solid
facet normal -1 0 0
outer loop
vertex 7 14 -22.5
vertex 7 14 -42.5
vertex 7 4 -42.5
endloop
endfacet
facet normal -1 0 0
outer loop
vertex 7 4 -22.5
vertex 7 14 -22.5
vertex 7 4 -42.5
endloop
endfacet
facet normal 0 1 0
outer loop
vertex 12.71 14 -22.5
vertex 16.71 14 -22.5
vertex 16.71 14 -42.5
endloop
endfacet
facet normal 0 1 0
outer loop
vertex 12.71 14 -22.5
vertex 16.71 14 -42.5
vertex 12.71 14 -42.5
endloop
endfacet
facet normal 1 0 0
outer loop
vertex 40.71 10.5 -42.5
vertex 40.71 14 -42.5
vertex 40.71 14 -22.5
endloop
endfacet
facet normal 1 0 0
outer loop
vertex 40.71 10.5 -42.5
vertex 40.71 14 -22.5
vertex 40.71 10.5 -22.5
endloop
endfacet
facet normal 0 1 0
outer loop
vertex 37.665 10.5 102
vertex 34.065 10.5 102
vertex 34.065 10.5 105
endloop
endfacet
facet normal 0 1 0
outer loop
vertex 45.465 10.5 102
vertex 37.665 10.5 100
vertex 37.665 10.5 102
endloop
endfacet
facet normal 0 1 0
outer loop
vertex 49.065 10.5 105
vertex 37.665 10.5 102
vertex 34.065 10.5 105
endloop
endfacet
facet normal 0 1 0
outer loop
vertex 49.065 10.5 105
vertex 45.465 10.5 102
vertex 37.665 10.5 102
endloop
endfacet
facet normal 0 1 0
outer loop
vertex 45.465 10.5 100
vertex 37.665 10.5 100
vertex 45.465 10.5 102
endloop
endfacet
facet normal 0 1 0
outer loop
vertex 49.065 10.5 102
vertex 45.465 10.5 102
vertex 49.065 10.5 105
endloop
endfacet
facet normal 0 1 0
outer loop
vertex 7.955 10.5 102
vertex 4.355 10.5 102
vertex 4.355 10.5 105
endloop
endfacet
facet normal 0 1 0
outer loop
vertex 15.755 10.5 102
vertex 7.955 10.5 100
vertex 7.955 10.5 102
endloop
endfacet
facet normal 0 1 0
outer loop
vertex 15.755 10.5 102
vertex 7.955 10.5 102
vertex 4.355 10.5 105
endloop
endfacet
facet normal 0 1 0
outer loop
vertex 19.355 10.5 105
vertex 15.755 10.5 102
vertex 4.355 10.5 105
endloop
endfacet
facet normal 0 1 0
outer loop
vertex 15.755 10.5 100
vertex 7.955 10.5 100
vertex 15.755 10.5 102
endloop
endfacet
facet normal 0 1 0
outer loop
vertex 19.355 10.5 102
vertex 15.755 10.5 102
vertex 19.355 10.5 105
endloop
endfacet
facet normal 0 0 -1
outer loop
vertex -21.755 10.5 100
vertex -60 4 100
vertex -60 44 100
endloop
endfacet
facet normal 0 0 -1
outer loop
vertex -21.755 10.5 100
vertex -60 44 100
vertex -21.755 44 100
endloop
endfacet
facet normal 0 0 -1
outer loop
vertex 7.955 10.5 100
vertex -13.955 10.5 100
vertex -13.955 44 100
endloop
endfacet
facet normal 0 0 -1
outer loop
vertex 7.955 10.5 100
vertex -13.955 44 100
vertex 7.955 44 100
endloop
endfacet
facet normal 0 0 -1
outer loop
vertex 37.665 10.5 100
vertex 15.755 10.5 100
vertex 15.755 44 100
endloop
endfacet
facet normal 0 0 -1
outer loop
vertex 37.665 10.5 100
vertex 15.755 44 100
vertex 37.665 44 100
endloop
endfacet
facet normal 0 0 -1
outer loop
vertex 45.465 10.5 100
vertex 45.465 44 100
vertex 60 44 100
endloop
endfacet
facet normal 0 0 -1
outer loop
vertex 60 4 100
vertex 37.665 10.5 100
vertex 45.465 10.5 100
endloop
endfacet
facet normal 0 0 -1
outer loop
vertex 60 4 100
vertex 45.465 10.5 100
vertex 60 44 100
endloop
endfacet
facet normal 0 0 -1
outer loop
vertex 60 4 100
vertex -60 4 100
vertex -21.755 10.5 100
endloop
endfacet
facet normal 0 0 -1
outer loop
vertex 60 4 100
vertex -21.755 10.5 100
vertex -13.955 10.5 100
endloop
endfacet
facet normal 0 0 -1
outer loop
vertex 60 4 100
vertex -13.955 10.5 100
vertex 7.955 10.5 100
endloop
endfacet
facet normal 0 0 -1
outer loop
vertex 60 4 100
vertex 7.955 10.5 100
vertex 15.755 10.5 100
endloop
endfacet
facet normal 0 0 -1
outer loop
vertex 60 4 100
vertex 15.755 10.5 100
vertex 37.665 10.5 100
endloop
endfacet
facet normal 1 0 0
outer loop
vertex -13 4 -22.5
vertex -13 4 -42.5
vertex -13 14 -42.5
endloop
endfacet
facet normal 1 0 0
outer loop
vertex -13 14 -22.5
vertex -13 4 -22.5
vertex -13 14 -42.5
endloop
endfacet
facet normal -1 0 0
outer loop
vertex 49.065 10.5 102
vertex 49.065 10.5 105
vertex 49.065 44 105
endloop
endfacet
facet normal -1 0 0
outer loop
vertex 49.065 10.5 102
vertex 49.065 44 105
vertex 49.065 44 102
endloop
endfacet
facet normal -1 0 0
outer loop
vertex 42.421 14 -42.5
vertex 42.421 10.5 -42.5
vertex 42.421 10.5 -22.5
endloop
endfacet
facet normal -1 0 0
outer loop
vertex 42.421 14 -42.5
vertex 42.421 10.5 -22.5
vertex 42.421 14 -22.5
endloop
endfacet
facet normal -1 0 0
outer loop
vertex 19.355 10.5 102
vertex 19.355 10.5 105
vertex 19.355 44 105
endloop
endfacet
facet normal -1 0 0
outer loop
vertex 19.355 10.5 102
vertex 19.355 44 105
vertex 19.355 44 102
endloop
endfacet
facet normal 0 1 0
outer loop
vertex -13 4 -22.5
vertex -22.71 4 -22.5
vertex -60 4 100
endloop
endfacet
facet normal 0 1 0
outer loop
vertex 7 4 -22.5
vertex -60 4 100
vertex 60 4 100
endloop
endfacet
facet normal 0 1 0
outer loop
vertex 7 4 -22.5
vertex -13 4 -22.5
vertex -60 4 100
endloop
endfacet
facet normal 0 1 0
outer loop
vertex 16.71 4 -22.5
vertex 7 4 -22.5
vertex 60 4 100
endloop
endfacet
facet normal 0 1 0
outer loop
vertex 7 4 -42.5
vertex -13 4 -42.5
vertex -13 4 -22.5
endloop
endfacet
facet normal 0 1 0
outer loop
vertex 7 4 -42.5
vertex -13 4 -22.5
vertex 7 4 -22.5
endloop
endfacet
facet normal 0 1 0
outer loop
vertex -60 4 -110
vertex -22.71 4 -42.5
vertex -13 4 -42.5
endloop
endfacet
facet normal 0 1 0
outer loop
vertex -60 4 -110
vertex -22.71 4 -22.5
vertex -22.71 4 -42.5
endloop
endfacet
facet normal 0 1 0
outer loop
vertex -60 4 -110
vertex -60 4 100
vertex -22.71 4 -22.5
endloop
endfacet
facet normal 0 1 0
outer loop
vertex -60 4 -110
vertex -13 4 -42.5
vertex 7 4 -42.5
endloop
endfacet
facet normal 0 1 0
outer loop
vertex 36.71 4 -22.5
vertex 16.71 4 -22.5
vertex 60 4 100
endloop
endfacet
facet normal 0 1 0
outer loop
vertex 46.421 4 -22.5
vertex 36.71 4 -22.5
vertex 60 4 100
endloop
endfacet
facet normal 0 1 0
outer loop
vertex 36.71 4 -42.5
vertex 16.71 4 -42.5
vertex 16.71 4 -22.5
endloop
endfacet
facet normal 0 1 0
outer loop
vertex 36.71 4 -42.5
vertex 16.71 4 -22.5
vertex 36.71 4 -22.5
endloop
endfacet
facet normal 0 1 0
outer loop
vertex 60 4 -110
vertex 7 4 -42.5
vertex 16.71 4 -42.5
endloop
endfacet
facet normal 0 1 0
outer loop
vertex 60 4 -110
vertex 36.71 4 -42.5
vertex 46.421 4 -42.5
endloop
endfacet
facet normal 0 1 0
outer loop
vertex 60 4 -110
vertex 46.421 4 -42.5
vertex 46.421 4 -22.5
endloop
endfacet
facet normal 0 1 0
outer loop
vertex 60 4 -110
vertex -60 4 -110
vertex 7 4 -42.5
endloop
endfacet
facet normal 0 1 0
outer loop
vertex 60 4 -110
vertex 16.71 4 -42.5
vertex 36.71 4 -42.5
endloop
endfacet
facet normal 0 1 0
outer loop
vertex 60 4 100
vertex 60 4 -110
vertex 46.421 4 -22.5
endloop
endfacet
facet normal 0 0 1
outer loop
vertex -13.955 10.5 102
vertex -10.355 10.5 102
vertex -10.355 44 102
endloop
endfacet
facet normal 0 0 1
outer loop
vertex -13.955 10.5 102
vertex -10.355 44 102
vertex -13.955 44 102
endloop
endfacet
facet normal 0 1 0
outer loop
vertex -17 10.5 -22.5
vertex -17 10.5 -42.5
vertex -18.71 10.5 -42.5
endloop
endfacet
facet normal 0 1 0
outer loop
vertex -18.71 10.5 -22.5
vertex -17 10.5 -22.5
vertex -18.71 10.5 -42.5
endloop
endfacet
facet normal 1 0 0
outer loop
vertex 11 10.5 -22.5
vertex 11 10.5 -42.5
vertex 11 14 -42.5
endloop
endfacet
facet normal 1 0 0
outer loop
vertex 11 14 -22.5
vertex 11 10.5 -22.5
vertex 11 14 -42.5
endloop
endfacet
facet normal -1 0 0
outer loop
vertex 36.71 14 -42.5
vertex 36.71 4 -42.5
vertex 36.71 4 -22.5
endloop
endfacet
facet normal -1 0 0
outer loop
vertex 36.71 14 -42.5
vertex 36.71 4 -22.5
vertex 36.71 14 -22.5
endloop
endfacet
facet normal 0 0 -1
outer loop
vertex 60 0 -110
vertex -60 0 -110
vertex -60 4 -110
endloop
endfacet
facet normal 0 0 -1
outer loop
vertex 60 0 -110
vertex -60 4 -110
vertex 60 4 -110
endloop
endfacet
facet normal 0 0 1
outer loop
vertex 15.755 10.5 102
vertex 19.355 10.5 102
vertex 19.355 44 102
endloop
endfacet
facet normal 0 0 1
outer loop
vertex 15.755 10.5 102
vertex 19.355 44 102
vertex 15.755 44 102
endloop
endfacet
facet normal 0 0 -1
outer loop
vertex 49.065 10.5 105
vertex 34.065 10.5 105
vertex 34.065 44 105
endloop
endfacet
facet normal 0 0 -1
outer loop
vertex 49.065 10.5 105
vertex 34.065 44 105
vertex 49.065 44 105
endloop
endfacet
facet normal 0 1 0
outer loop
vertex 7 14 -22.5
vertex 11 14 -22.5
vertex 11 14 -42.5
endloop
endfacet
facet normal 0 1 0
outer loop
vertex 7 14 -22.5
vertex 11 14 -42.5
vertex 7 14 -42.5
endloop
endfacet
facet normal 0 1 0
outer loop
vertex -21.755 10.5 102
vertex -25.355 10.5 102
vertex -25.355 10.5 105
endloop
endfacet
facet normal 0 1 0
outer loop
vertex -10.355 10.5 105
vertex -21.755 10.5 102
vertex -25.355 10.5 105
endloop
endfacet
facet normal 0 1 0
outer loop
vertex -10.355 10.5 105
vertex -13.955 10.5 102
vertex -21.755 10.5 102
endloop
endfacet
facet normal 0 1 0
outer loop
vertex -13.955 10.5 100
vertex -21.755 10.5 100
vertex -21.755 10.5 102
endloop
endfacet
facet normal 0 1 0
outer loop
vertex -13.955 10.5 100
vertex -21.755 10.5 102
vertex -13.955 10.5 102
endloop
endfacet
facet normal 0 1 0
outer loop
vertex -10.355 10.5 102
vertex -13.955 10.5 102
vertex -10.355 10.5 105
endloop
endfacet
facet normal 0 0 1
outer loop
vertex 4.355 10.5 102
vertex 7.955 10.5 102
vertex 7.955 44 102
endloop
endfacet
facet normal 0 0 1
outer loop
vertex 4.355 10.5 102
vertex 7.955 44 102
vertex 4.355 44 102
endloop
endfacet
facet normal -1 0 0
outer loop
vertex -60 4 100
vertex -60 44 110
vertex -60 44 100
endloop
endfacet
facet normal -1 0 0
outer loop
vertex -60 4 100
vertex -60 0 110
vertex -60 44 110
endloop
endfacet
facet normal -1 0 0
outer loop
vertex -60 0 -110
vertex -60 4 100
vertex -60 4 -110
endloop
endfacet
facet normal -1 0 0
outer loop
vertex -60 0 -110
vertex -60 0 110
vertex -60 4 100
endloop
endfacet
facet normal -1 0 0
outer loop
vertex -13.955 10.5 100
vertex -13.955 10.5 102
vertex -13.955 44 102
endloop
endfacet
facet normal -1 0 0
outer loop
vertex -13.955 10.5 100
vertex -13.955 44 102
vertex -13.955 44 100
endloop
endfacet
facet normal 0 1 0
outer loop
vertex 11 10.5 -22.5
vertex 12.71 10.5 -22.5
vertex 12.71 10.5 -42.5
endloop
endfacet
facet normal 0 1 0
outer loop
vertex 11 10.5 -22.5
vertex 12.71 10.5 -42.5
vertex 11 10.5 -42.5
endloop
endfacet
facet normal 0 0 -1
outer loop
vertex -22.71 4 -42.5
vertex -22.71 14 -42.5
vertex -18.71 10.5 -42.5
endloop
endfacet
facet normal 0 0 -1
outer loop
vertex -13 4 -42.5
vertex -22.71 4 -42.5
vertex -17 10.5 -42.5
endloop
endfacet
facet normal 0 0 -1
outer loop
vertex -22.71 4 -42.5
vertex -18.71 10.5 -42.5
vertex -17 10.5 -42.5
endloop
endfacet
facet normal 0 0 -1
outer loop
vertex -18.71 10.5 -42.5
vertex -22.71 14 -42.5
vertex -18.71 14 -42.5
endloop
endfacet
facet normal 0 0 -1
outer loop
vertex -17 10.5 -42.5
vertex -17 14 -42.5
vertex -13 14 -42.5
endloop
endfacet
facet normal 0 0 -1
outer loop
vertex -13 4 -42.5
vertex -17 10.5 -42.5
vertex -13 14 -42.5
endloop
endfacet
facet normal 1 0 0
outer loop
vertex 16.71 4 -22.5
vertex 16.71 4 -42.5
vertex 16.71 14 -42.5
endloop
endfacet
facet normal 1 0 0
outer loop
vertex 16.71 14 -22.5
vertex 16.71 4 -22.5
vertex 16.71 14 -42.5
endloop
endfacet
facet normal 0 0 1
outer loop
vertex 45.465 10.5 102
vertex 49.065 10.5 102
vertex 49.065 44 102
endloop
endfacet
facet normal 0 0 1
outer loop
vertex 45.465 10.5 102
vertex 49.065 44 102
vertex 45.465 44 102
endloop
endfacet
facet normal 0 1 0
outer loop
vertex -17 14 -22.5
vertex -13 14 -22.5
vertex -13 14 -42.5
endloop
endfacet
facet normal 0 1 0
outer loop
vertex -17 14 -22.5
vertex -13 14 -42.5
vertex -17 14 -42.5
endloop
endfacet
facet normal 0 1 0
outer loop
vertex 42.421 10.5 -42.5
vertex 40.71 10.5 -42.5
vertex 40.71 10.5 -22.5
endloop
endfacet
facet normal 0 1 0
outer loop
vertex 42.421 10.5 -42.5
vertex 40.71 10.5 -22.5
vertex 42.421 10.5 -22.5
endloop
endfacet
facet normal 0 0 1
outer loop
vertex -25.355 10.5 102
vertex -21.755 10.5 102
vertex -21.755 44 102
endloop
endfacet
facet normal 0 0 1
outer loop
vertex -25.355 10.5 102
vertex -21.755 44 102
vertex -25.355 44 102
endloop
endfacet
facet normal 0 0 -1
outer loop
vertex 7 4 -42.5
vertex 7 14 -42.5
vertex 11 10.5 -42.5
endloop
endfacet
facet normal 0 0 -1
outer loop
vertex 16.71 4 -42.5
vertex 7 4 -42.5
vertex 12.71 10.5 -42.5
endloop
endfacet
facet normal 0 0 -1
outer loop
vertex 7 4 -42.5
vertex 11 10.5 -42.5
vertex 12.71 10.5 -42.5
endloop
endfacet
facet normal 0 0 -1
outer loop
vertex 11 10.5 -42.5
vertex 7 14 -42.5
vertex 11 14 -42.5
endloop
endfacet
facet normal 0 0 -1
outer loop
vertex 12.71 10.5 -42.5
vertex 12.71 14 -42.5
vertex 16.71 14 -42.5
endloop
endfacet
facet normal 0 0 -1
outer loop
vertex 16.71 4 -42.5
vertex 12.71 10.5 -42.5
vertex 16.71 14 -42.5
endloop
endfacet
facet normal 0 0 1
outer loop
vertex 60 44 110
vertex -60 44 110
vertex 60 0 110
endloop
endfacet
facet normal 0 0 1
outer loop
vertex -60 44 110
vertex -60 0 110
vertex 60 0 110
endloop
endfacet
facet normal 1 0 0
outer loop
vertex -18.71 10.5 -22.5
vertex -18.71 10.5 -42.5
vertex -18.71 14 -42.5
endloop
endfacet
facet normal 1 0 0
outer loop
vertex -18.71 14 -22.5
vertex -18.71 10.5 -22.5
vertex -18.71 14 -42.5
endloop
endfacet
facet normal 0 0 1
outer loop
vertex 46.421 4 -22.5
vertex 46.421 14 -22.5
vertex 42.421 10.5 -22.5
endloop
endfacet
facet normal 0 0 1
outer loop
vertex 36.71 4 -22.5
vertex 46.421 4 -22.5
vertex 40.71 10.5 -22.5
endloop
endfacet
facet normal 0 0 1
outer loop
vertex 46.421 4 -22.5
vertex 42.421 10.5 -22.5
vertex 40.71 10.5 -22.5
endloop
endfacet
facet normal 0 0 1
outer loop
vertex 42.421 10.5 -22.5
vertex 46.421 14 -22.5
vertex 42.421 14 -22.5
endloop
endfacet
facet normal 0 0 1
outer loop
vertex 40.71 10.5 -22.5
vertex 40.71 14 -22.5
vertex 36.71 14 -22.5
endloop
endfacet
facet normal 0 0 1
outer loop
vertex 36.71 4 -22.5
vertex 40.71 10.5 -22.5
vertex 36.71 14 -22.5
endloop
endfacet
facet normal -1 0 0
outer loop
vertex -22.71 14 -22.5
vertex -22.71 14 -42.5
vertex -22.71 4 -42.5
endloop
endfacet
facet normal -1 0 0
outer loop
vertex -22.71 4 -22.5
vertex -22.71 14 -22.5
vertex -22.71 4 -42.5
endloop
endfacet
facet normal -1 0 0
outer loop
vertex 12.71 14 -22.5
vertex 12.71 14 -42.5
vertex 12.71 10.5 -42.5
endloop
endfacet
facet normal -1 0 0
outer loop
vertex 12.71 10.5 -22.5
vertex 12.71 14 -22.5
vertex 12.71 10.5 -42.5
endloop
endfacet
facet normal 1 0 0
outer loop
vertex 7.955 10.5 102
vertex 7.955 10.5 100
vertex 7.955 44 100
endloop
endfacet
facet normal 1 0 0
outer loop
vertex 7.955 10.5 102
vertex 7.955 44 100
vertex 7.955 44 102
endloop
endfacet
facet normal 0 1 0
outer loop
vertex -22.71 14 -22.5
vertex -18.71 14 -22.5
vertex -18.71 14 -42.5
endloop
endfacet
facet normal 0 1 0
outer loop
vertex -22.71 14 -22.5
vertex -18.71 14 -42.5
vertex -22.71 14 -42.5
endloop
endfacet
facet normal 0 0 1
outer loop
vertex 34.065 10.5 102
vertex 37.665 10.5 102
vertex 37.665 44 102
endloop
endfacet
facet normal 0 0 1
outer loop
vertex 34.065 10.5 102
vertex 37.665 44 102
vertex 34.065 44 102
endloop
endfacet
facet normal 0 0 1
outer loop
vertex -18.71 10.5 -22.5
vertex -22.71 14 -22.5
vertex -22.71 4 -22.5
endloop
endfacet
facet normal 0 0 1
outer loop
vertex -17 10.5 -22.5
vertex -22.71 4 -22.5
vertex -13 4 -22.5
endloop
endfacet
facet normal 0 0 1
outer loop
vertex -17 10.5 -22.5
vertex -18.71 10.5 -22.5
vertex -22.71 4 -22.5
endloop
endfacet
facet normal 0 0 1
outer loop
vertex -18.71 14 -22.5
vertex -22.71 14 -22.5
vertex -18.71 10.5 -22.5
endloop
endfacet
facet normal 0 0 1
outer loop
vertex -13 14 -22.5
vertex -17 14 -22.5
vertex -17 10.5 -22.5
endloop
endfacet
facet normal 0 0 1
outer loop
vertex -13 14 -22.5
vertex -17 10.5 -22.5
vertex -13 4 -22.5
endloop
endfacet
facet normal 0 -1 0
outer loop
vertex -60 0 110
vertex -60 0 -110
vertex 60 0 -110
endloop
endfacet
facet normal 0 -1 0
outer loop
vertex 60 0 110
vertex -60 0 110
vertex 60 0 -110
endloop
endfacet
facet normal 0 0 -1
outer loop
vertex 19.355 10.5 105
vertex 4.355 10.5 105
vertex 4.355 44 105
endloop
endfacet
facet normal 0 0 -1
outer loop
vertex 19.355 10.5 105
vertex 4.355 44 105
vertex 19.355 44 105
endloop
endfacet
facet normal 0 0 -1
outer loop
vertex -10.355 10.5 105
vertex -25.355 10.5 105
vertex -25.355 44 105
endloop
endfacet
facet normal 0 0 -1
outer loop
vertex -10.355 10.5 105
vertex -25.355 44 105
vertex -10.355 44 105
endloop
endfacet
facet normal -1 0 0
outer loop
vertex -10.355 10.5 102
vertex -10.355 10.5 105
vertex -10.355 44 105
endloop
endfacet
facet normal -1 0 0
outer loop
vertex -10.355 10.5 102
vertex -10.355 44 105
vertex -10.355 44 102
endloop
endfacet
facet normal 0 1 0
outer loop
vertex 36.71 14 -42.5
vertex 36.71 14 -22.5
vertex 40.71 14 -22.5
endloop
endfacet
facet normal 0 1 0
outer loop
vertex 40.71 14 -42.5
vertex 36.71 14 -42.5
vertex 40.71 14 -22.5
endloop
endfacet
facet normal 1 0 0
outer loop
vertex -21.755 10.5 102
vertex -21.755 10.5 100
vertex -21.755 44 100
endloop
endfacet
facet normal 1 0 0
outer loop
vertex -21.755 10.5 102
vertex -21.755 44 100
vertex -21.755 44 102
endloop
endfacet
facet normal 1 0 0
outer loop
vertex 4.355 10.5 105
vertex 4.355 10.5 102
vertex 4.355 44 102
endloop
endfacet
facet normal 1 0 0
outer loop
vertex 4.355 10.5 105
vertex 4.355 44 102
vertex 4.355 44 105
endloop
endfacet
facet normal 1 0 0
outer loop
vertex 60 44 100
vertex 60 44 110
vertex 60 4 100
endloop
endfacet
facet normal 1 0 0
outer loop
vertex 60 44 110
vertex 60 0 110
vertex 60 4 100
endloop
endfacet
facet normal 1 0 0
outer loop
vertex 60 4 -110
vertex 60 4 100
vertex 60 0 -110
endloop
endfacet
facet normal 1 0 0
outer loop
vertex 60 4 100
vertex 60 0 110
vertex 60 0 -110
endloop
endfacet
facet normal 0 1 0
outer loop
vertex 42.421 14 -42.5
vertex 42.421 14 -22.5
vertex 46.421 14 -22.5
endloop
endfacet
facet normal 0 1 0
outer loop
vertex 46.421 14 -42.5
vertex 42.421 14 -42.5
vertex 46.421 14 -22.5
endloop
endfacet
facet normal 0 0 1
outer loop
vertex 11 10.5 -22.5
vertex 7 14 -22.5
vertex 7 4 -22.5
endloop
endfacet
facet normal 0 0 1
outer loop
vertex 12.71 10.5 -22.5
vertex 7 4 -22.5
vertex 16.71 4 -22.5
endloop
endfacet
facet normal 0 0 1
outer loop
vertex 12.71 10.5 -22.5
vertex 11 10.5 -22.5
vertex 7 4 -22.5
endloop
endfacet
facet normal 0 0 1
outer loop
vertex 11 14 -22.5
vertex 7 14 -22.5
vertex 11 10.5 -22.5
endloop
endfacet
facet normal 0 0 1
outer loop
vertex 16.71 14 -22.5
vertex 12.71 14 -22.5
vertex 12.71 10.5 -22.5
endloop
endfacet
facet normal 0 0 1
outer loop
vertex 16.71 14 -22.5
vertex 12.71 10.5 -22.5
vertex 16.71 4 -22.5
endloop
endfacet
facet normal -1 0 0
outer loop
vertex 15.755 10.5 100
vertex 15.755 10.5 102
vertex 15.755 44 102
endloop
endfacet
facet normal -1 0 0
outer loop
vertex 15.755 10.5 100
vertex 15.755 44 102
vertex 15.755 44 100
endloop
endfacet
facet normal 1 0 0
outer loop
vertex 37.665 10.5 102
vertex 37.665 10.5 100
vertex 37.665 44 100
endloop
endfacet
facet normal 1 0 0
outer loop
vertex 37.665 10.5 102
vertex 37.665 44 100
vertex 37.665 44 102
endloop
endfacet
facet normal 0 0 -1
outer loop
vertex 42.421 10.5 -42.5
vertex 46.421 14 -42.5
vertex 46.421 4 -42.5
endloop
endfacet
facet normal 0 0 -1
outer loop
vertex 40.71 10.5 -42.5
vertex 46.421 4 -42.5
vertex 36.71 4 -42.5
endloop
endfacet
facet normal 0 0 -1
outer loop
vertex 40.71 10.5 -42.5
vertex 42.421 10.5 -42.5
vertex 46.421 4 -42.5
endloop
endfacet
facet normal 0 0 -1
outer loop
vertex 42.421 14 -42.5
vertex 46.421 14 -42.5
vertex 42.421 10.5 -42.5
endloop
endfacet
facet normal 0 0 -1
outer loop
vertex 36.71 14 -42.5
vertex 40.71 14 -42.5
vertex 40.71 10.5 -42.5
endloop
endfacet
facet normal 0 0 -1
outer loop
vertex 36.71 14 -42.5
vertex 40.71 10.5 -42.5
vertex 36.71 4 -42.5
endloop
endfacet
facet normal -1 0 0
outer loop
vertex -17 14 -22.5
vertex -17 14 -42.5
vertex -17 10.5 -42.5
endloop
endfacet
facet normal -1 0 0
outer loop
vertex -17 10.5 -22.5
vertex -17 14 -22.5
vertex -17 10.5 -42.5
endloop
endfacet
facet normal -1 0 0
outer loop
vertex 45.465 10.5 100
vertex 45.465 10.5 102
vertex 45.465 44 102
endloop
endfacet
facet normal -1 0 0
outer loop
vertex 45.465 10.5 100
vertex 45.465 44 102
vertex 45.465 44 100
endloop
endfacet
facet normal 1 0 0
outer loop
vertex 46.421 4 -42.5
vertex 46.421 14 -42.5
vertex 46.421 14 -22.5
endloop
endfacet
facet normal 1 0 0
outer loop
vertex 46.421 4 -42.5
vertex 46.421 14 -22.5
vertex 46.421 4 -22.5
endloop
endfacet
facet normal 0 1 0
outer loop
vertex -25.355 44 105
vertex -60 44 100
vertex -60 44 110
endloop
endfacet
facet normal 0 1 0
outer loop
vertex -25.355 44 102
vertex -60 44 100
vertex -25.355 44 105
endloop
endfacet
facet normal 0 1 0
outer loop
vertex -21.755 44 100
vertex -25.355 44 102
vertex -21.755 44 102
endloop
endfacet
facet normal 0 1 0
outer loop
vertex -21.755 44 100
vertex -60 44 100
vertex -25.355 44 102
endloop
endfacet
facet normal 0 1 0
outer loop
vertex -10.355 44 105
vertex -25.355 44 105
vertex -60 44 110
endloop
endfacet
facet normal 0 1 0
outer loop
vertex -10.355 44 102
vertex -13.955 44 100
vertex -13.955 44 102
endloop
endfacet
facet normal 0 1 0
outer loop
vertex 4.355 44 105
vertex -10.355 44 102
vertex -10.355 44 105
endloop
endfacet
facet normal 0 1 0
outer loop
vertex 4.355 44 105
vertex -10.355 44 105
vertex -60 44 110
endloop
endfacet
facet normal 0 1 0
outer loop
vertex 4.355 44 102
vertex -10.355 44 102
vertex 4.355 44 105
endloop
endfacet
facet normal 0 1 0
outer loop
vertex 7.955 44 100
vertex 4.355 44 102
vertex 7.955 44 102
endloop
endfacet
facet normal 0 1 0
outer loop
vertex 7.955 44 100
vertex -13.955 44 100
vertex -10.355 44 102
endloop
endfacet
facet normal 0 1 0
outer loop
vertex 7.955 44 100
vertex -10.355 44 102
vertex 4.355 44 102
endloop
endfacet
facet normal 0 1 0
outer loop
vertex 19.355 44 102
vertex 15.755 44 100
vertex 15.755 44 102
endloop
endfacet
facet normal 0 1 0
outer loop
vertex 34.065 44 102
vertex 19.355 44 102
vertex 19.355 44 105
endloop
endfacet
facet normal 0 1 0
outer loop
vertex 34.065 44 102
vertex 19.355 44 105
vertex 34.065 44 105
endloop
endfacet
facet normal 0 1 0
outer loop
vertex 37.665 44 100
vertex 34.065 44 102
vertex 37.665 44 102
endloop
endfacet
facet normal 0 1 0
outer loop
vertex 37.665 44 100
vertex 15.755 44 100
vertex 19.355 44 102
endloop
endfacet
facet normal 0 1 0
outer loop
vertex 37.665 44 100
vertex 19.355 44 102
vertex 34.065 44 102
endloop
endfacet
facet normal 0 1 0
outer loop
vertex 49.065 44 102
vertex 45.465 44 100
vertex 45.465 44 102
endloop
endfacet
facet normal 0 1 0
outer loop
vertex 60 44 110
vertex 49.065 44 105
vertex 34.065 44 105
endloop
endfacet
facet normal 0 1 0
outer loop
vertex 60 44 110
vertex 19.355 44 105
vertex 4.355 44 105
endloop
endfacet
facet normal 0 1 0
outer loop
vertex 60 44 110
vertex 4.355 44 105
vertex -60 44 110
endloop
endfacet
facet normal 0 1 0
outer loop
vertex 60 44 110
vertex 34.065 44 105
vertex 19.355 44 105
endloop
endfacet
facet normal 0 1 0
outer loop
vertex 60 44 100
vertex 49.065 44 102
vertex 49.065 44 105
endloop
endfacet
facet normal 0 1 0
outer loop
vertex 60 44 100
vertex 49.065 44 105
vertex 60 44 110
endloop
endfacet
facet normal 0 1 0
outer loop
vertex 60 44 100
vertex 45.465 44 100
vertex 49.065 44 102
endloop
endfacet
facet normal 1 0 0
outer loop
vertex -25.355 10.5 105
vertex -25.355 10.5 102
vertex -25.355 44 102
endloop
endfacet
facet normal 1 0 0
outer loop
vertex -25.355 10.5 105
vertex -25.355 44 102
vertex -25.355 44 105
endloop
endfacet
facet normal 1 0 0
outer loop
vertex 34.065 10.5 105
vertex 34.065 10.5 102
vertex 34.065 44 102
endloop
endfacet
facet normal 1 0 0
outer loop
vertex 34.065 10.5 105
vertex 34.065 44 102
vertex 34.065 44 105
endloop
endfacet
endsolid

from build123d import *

# Parameters (mm, degrees)
SKETCH1_W           = 120
SKETCH1_H           = 220
BOSS_EXTRUDE1_DEPTH = 4
SKETCH2_W           = 120
SKETCH2_H           = 10
BOSS_EXTRUDE2_DEPTH = 40
CUT_EXTRUDE1_START  = -33.5
CUT_EXTRUDE1_DEPTH  = 33.5
BOSS_EXTRUDE3_DEPTH = 20


with BuildPart() as part:
    # Sketch1 → Boss-Extrude1 (new body)
    with BuildSketch(Plane(origin=(0, 0, 0), x_dir=(1, 0, 0), z_dir=(0, 1, 0))):
        Rectangle(SKETCH1_W, SKETCH1_H)
    extrude(amount=BOSS_EXTRUDE1_DEPTH)

    # Sketch2 → Boss-Extrude2 (add)
    with BuildSketch(Plane(origin=(0, 4, 0), x_dir=(1, 0, 0), z_dir=(0, 1, 0))):
        with Locations((0, -105)):
            Rectangle(SKETCH2_W, SKETCH2_H)
    extrude(amount=BOSS_EXTRUDE2_DEPTH)

    # Sketch4 → Cut-Extrude1 (cut)
    with BuildSketch(Plane(origin=(0, 44, 0), x_dir=(1, 0, 0), z_dir=(0, 1, 0)).offset(CUT_EXTRUDE1_START)):
        Polygon((49.06548636, -105), (49.06548636, -102), (45.46548636, -102), (45.46548636, -92), (37.66548636, -92), (37.66548636, -102), (34.06548636, -102), (34.06548636, -105), align=None)
        Polygon((19.35516212, -105), (19.35516212, -102), (15.75516212, -102), (15.75516212, -92), (7.95516212, -92), (7.95516212, -102), (4.35516212, -102), (4.35516212, -105), align=None)
        Polygon((-10.35516212, -105), (-10.35516212, -102), (-13.95516212, -102), (-13.95516212, -92), (-21.75516212, -92), (-21.75516212, -102), (-25.35516212, -102), (-25.35516212, -105), align=None)
    extrude(amount=CUT_EXTRUDE1_DEPTH, mode=Mode.SUBTRACT)

    # Sketch5 → Boss-Extrude3 (add)
    with BuildSketch(Plane(origin=(0, 0, -42.5), x_dir=(-1, 0, 0), z_dir=(0, 0, -1))):
        Polygon((-46.42064848, 4), (-36.71032424, 4), (-36.71032424, 14), (-40.71032424, 14), (-40.71032424, 10.5), (-42.42064848, 10.5), (-42.42064848, 14), (-46.42064848, 14), align=None)
        Polygon((-16.71032424, 4), (-16.71032424, 14), (-12.71032424, 14), (-12.71032424, 10.5), (-11, 10.5), (-11, 14), (-7, 14), (-7, 4), align=None)
        Polygon((13, 4), (13, 14), (17, 14), (17, 10.5), (18.71032424, 10.5), (18.71032424, 14), (22.71032424, 14), (22.71032424, 4), align=None)
    extrude(amount=-BOSS_EXTRUDE3_DEPTH)


solid = part.part
